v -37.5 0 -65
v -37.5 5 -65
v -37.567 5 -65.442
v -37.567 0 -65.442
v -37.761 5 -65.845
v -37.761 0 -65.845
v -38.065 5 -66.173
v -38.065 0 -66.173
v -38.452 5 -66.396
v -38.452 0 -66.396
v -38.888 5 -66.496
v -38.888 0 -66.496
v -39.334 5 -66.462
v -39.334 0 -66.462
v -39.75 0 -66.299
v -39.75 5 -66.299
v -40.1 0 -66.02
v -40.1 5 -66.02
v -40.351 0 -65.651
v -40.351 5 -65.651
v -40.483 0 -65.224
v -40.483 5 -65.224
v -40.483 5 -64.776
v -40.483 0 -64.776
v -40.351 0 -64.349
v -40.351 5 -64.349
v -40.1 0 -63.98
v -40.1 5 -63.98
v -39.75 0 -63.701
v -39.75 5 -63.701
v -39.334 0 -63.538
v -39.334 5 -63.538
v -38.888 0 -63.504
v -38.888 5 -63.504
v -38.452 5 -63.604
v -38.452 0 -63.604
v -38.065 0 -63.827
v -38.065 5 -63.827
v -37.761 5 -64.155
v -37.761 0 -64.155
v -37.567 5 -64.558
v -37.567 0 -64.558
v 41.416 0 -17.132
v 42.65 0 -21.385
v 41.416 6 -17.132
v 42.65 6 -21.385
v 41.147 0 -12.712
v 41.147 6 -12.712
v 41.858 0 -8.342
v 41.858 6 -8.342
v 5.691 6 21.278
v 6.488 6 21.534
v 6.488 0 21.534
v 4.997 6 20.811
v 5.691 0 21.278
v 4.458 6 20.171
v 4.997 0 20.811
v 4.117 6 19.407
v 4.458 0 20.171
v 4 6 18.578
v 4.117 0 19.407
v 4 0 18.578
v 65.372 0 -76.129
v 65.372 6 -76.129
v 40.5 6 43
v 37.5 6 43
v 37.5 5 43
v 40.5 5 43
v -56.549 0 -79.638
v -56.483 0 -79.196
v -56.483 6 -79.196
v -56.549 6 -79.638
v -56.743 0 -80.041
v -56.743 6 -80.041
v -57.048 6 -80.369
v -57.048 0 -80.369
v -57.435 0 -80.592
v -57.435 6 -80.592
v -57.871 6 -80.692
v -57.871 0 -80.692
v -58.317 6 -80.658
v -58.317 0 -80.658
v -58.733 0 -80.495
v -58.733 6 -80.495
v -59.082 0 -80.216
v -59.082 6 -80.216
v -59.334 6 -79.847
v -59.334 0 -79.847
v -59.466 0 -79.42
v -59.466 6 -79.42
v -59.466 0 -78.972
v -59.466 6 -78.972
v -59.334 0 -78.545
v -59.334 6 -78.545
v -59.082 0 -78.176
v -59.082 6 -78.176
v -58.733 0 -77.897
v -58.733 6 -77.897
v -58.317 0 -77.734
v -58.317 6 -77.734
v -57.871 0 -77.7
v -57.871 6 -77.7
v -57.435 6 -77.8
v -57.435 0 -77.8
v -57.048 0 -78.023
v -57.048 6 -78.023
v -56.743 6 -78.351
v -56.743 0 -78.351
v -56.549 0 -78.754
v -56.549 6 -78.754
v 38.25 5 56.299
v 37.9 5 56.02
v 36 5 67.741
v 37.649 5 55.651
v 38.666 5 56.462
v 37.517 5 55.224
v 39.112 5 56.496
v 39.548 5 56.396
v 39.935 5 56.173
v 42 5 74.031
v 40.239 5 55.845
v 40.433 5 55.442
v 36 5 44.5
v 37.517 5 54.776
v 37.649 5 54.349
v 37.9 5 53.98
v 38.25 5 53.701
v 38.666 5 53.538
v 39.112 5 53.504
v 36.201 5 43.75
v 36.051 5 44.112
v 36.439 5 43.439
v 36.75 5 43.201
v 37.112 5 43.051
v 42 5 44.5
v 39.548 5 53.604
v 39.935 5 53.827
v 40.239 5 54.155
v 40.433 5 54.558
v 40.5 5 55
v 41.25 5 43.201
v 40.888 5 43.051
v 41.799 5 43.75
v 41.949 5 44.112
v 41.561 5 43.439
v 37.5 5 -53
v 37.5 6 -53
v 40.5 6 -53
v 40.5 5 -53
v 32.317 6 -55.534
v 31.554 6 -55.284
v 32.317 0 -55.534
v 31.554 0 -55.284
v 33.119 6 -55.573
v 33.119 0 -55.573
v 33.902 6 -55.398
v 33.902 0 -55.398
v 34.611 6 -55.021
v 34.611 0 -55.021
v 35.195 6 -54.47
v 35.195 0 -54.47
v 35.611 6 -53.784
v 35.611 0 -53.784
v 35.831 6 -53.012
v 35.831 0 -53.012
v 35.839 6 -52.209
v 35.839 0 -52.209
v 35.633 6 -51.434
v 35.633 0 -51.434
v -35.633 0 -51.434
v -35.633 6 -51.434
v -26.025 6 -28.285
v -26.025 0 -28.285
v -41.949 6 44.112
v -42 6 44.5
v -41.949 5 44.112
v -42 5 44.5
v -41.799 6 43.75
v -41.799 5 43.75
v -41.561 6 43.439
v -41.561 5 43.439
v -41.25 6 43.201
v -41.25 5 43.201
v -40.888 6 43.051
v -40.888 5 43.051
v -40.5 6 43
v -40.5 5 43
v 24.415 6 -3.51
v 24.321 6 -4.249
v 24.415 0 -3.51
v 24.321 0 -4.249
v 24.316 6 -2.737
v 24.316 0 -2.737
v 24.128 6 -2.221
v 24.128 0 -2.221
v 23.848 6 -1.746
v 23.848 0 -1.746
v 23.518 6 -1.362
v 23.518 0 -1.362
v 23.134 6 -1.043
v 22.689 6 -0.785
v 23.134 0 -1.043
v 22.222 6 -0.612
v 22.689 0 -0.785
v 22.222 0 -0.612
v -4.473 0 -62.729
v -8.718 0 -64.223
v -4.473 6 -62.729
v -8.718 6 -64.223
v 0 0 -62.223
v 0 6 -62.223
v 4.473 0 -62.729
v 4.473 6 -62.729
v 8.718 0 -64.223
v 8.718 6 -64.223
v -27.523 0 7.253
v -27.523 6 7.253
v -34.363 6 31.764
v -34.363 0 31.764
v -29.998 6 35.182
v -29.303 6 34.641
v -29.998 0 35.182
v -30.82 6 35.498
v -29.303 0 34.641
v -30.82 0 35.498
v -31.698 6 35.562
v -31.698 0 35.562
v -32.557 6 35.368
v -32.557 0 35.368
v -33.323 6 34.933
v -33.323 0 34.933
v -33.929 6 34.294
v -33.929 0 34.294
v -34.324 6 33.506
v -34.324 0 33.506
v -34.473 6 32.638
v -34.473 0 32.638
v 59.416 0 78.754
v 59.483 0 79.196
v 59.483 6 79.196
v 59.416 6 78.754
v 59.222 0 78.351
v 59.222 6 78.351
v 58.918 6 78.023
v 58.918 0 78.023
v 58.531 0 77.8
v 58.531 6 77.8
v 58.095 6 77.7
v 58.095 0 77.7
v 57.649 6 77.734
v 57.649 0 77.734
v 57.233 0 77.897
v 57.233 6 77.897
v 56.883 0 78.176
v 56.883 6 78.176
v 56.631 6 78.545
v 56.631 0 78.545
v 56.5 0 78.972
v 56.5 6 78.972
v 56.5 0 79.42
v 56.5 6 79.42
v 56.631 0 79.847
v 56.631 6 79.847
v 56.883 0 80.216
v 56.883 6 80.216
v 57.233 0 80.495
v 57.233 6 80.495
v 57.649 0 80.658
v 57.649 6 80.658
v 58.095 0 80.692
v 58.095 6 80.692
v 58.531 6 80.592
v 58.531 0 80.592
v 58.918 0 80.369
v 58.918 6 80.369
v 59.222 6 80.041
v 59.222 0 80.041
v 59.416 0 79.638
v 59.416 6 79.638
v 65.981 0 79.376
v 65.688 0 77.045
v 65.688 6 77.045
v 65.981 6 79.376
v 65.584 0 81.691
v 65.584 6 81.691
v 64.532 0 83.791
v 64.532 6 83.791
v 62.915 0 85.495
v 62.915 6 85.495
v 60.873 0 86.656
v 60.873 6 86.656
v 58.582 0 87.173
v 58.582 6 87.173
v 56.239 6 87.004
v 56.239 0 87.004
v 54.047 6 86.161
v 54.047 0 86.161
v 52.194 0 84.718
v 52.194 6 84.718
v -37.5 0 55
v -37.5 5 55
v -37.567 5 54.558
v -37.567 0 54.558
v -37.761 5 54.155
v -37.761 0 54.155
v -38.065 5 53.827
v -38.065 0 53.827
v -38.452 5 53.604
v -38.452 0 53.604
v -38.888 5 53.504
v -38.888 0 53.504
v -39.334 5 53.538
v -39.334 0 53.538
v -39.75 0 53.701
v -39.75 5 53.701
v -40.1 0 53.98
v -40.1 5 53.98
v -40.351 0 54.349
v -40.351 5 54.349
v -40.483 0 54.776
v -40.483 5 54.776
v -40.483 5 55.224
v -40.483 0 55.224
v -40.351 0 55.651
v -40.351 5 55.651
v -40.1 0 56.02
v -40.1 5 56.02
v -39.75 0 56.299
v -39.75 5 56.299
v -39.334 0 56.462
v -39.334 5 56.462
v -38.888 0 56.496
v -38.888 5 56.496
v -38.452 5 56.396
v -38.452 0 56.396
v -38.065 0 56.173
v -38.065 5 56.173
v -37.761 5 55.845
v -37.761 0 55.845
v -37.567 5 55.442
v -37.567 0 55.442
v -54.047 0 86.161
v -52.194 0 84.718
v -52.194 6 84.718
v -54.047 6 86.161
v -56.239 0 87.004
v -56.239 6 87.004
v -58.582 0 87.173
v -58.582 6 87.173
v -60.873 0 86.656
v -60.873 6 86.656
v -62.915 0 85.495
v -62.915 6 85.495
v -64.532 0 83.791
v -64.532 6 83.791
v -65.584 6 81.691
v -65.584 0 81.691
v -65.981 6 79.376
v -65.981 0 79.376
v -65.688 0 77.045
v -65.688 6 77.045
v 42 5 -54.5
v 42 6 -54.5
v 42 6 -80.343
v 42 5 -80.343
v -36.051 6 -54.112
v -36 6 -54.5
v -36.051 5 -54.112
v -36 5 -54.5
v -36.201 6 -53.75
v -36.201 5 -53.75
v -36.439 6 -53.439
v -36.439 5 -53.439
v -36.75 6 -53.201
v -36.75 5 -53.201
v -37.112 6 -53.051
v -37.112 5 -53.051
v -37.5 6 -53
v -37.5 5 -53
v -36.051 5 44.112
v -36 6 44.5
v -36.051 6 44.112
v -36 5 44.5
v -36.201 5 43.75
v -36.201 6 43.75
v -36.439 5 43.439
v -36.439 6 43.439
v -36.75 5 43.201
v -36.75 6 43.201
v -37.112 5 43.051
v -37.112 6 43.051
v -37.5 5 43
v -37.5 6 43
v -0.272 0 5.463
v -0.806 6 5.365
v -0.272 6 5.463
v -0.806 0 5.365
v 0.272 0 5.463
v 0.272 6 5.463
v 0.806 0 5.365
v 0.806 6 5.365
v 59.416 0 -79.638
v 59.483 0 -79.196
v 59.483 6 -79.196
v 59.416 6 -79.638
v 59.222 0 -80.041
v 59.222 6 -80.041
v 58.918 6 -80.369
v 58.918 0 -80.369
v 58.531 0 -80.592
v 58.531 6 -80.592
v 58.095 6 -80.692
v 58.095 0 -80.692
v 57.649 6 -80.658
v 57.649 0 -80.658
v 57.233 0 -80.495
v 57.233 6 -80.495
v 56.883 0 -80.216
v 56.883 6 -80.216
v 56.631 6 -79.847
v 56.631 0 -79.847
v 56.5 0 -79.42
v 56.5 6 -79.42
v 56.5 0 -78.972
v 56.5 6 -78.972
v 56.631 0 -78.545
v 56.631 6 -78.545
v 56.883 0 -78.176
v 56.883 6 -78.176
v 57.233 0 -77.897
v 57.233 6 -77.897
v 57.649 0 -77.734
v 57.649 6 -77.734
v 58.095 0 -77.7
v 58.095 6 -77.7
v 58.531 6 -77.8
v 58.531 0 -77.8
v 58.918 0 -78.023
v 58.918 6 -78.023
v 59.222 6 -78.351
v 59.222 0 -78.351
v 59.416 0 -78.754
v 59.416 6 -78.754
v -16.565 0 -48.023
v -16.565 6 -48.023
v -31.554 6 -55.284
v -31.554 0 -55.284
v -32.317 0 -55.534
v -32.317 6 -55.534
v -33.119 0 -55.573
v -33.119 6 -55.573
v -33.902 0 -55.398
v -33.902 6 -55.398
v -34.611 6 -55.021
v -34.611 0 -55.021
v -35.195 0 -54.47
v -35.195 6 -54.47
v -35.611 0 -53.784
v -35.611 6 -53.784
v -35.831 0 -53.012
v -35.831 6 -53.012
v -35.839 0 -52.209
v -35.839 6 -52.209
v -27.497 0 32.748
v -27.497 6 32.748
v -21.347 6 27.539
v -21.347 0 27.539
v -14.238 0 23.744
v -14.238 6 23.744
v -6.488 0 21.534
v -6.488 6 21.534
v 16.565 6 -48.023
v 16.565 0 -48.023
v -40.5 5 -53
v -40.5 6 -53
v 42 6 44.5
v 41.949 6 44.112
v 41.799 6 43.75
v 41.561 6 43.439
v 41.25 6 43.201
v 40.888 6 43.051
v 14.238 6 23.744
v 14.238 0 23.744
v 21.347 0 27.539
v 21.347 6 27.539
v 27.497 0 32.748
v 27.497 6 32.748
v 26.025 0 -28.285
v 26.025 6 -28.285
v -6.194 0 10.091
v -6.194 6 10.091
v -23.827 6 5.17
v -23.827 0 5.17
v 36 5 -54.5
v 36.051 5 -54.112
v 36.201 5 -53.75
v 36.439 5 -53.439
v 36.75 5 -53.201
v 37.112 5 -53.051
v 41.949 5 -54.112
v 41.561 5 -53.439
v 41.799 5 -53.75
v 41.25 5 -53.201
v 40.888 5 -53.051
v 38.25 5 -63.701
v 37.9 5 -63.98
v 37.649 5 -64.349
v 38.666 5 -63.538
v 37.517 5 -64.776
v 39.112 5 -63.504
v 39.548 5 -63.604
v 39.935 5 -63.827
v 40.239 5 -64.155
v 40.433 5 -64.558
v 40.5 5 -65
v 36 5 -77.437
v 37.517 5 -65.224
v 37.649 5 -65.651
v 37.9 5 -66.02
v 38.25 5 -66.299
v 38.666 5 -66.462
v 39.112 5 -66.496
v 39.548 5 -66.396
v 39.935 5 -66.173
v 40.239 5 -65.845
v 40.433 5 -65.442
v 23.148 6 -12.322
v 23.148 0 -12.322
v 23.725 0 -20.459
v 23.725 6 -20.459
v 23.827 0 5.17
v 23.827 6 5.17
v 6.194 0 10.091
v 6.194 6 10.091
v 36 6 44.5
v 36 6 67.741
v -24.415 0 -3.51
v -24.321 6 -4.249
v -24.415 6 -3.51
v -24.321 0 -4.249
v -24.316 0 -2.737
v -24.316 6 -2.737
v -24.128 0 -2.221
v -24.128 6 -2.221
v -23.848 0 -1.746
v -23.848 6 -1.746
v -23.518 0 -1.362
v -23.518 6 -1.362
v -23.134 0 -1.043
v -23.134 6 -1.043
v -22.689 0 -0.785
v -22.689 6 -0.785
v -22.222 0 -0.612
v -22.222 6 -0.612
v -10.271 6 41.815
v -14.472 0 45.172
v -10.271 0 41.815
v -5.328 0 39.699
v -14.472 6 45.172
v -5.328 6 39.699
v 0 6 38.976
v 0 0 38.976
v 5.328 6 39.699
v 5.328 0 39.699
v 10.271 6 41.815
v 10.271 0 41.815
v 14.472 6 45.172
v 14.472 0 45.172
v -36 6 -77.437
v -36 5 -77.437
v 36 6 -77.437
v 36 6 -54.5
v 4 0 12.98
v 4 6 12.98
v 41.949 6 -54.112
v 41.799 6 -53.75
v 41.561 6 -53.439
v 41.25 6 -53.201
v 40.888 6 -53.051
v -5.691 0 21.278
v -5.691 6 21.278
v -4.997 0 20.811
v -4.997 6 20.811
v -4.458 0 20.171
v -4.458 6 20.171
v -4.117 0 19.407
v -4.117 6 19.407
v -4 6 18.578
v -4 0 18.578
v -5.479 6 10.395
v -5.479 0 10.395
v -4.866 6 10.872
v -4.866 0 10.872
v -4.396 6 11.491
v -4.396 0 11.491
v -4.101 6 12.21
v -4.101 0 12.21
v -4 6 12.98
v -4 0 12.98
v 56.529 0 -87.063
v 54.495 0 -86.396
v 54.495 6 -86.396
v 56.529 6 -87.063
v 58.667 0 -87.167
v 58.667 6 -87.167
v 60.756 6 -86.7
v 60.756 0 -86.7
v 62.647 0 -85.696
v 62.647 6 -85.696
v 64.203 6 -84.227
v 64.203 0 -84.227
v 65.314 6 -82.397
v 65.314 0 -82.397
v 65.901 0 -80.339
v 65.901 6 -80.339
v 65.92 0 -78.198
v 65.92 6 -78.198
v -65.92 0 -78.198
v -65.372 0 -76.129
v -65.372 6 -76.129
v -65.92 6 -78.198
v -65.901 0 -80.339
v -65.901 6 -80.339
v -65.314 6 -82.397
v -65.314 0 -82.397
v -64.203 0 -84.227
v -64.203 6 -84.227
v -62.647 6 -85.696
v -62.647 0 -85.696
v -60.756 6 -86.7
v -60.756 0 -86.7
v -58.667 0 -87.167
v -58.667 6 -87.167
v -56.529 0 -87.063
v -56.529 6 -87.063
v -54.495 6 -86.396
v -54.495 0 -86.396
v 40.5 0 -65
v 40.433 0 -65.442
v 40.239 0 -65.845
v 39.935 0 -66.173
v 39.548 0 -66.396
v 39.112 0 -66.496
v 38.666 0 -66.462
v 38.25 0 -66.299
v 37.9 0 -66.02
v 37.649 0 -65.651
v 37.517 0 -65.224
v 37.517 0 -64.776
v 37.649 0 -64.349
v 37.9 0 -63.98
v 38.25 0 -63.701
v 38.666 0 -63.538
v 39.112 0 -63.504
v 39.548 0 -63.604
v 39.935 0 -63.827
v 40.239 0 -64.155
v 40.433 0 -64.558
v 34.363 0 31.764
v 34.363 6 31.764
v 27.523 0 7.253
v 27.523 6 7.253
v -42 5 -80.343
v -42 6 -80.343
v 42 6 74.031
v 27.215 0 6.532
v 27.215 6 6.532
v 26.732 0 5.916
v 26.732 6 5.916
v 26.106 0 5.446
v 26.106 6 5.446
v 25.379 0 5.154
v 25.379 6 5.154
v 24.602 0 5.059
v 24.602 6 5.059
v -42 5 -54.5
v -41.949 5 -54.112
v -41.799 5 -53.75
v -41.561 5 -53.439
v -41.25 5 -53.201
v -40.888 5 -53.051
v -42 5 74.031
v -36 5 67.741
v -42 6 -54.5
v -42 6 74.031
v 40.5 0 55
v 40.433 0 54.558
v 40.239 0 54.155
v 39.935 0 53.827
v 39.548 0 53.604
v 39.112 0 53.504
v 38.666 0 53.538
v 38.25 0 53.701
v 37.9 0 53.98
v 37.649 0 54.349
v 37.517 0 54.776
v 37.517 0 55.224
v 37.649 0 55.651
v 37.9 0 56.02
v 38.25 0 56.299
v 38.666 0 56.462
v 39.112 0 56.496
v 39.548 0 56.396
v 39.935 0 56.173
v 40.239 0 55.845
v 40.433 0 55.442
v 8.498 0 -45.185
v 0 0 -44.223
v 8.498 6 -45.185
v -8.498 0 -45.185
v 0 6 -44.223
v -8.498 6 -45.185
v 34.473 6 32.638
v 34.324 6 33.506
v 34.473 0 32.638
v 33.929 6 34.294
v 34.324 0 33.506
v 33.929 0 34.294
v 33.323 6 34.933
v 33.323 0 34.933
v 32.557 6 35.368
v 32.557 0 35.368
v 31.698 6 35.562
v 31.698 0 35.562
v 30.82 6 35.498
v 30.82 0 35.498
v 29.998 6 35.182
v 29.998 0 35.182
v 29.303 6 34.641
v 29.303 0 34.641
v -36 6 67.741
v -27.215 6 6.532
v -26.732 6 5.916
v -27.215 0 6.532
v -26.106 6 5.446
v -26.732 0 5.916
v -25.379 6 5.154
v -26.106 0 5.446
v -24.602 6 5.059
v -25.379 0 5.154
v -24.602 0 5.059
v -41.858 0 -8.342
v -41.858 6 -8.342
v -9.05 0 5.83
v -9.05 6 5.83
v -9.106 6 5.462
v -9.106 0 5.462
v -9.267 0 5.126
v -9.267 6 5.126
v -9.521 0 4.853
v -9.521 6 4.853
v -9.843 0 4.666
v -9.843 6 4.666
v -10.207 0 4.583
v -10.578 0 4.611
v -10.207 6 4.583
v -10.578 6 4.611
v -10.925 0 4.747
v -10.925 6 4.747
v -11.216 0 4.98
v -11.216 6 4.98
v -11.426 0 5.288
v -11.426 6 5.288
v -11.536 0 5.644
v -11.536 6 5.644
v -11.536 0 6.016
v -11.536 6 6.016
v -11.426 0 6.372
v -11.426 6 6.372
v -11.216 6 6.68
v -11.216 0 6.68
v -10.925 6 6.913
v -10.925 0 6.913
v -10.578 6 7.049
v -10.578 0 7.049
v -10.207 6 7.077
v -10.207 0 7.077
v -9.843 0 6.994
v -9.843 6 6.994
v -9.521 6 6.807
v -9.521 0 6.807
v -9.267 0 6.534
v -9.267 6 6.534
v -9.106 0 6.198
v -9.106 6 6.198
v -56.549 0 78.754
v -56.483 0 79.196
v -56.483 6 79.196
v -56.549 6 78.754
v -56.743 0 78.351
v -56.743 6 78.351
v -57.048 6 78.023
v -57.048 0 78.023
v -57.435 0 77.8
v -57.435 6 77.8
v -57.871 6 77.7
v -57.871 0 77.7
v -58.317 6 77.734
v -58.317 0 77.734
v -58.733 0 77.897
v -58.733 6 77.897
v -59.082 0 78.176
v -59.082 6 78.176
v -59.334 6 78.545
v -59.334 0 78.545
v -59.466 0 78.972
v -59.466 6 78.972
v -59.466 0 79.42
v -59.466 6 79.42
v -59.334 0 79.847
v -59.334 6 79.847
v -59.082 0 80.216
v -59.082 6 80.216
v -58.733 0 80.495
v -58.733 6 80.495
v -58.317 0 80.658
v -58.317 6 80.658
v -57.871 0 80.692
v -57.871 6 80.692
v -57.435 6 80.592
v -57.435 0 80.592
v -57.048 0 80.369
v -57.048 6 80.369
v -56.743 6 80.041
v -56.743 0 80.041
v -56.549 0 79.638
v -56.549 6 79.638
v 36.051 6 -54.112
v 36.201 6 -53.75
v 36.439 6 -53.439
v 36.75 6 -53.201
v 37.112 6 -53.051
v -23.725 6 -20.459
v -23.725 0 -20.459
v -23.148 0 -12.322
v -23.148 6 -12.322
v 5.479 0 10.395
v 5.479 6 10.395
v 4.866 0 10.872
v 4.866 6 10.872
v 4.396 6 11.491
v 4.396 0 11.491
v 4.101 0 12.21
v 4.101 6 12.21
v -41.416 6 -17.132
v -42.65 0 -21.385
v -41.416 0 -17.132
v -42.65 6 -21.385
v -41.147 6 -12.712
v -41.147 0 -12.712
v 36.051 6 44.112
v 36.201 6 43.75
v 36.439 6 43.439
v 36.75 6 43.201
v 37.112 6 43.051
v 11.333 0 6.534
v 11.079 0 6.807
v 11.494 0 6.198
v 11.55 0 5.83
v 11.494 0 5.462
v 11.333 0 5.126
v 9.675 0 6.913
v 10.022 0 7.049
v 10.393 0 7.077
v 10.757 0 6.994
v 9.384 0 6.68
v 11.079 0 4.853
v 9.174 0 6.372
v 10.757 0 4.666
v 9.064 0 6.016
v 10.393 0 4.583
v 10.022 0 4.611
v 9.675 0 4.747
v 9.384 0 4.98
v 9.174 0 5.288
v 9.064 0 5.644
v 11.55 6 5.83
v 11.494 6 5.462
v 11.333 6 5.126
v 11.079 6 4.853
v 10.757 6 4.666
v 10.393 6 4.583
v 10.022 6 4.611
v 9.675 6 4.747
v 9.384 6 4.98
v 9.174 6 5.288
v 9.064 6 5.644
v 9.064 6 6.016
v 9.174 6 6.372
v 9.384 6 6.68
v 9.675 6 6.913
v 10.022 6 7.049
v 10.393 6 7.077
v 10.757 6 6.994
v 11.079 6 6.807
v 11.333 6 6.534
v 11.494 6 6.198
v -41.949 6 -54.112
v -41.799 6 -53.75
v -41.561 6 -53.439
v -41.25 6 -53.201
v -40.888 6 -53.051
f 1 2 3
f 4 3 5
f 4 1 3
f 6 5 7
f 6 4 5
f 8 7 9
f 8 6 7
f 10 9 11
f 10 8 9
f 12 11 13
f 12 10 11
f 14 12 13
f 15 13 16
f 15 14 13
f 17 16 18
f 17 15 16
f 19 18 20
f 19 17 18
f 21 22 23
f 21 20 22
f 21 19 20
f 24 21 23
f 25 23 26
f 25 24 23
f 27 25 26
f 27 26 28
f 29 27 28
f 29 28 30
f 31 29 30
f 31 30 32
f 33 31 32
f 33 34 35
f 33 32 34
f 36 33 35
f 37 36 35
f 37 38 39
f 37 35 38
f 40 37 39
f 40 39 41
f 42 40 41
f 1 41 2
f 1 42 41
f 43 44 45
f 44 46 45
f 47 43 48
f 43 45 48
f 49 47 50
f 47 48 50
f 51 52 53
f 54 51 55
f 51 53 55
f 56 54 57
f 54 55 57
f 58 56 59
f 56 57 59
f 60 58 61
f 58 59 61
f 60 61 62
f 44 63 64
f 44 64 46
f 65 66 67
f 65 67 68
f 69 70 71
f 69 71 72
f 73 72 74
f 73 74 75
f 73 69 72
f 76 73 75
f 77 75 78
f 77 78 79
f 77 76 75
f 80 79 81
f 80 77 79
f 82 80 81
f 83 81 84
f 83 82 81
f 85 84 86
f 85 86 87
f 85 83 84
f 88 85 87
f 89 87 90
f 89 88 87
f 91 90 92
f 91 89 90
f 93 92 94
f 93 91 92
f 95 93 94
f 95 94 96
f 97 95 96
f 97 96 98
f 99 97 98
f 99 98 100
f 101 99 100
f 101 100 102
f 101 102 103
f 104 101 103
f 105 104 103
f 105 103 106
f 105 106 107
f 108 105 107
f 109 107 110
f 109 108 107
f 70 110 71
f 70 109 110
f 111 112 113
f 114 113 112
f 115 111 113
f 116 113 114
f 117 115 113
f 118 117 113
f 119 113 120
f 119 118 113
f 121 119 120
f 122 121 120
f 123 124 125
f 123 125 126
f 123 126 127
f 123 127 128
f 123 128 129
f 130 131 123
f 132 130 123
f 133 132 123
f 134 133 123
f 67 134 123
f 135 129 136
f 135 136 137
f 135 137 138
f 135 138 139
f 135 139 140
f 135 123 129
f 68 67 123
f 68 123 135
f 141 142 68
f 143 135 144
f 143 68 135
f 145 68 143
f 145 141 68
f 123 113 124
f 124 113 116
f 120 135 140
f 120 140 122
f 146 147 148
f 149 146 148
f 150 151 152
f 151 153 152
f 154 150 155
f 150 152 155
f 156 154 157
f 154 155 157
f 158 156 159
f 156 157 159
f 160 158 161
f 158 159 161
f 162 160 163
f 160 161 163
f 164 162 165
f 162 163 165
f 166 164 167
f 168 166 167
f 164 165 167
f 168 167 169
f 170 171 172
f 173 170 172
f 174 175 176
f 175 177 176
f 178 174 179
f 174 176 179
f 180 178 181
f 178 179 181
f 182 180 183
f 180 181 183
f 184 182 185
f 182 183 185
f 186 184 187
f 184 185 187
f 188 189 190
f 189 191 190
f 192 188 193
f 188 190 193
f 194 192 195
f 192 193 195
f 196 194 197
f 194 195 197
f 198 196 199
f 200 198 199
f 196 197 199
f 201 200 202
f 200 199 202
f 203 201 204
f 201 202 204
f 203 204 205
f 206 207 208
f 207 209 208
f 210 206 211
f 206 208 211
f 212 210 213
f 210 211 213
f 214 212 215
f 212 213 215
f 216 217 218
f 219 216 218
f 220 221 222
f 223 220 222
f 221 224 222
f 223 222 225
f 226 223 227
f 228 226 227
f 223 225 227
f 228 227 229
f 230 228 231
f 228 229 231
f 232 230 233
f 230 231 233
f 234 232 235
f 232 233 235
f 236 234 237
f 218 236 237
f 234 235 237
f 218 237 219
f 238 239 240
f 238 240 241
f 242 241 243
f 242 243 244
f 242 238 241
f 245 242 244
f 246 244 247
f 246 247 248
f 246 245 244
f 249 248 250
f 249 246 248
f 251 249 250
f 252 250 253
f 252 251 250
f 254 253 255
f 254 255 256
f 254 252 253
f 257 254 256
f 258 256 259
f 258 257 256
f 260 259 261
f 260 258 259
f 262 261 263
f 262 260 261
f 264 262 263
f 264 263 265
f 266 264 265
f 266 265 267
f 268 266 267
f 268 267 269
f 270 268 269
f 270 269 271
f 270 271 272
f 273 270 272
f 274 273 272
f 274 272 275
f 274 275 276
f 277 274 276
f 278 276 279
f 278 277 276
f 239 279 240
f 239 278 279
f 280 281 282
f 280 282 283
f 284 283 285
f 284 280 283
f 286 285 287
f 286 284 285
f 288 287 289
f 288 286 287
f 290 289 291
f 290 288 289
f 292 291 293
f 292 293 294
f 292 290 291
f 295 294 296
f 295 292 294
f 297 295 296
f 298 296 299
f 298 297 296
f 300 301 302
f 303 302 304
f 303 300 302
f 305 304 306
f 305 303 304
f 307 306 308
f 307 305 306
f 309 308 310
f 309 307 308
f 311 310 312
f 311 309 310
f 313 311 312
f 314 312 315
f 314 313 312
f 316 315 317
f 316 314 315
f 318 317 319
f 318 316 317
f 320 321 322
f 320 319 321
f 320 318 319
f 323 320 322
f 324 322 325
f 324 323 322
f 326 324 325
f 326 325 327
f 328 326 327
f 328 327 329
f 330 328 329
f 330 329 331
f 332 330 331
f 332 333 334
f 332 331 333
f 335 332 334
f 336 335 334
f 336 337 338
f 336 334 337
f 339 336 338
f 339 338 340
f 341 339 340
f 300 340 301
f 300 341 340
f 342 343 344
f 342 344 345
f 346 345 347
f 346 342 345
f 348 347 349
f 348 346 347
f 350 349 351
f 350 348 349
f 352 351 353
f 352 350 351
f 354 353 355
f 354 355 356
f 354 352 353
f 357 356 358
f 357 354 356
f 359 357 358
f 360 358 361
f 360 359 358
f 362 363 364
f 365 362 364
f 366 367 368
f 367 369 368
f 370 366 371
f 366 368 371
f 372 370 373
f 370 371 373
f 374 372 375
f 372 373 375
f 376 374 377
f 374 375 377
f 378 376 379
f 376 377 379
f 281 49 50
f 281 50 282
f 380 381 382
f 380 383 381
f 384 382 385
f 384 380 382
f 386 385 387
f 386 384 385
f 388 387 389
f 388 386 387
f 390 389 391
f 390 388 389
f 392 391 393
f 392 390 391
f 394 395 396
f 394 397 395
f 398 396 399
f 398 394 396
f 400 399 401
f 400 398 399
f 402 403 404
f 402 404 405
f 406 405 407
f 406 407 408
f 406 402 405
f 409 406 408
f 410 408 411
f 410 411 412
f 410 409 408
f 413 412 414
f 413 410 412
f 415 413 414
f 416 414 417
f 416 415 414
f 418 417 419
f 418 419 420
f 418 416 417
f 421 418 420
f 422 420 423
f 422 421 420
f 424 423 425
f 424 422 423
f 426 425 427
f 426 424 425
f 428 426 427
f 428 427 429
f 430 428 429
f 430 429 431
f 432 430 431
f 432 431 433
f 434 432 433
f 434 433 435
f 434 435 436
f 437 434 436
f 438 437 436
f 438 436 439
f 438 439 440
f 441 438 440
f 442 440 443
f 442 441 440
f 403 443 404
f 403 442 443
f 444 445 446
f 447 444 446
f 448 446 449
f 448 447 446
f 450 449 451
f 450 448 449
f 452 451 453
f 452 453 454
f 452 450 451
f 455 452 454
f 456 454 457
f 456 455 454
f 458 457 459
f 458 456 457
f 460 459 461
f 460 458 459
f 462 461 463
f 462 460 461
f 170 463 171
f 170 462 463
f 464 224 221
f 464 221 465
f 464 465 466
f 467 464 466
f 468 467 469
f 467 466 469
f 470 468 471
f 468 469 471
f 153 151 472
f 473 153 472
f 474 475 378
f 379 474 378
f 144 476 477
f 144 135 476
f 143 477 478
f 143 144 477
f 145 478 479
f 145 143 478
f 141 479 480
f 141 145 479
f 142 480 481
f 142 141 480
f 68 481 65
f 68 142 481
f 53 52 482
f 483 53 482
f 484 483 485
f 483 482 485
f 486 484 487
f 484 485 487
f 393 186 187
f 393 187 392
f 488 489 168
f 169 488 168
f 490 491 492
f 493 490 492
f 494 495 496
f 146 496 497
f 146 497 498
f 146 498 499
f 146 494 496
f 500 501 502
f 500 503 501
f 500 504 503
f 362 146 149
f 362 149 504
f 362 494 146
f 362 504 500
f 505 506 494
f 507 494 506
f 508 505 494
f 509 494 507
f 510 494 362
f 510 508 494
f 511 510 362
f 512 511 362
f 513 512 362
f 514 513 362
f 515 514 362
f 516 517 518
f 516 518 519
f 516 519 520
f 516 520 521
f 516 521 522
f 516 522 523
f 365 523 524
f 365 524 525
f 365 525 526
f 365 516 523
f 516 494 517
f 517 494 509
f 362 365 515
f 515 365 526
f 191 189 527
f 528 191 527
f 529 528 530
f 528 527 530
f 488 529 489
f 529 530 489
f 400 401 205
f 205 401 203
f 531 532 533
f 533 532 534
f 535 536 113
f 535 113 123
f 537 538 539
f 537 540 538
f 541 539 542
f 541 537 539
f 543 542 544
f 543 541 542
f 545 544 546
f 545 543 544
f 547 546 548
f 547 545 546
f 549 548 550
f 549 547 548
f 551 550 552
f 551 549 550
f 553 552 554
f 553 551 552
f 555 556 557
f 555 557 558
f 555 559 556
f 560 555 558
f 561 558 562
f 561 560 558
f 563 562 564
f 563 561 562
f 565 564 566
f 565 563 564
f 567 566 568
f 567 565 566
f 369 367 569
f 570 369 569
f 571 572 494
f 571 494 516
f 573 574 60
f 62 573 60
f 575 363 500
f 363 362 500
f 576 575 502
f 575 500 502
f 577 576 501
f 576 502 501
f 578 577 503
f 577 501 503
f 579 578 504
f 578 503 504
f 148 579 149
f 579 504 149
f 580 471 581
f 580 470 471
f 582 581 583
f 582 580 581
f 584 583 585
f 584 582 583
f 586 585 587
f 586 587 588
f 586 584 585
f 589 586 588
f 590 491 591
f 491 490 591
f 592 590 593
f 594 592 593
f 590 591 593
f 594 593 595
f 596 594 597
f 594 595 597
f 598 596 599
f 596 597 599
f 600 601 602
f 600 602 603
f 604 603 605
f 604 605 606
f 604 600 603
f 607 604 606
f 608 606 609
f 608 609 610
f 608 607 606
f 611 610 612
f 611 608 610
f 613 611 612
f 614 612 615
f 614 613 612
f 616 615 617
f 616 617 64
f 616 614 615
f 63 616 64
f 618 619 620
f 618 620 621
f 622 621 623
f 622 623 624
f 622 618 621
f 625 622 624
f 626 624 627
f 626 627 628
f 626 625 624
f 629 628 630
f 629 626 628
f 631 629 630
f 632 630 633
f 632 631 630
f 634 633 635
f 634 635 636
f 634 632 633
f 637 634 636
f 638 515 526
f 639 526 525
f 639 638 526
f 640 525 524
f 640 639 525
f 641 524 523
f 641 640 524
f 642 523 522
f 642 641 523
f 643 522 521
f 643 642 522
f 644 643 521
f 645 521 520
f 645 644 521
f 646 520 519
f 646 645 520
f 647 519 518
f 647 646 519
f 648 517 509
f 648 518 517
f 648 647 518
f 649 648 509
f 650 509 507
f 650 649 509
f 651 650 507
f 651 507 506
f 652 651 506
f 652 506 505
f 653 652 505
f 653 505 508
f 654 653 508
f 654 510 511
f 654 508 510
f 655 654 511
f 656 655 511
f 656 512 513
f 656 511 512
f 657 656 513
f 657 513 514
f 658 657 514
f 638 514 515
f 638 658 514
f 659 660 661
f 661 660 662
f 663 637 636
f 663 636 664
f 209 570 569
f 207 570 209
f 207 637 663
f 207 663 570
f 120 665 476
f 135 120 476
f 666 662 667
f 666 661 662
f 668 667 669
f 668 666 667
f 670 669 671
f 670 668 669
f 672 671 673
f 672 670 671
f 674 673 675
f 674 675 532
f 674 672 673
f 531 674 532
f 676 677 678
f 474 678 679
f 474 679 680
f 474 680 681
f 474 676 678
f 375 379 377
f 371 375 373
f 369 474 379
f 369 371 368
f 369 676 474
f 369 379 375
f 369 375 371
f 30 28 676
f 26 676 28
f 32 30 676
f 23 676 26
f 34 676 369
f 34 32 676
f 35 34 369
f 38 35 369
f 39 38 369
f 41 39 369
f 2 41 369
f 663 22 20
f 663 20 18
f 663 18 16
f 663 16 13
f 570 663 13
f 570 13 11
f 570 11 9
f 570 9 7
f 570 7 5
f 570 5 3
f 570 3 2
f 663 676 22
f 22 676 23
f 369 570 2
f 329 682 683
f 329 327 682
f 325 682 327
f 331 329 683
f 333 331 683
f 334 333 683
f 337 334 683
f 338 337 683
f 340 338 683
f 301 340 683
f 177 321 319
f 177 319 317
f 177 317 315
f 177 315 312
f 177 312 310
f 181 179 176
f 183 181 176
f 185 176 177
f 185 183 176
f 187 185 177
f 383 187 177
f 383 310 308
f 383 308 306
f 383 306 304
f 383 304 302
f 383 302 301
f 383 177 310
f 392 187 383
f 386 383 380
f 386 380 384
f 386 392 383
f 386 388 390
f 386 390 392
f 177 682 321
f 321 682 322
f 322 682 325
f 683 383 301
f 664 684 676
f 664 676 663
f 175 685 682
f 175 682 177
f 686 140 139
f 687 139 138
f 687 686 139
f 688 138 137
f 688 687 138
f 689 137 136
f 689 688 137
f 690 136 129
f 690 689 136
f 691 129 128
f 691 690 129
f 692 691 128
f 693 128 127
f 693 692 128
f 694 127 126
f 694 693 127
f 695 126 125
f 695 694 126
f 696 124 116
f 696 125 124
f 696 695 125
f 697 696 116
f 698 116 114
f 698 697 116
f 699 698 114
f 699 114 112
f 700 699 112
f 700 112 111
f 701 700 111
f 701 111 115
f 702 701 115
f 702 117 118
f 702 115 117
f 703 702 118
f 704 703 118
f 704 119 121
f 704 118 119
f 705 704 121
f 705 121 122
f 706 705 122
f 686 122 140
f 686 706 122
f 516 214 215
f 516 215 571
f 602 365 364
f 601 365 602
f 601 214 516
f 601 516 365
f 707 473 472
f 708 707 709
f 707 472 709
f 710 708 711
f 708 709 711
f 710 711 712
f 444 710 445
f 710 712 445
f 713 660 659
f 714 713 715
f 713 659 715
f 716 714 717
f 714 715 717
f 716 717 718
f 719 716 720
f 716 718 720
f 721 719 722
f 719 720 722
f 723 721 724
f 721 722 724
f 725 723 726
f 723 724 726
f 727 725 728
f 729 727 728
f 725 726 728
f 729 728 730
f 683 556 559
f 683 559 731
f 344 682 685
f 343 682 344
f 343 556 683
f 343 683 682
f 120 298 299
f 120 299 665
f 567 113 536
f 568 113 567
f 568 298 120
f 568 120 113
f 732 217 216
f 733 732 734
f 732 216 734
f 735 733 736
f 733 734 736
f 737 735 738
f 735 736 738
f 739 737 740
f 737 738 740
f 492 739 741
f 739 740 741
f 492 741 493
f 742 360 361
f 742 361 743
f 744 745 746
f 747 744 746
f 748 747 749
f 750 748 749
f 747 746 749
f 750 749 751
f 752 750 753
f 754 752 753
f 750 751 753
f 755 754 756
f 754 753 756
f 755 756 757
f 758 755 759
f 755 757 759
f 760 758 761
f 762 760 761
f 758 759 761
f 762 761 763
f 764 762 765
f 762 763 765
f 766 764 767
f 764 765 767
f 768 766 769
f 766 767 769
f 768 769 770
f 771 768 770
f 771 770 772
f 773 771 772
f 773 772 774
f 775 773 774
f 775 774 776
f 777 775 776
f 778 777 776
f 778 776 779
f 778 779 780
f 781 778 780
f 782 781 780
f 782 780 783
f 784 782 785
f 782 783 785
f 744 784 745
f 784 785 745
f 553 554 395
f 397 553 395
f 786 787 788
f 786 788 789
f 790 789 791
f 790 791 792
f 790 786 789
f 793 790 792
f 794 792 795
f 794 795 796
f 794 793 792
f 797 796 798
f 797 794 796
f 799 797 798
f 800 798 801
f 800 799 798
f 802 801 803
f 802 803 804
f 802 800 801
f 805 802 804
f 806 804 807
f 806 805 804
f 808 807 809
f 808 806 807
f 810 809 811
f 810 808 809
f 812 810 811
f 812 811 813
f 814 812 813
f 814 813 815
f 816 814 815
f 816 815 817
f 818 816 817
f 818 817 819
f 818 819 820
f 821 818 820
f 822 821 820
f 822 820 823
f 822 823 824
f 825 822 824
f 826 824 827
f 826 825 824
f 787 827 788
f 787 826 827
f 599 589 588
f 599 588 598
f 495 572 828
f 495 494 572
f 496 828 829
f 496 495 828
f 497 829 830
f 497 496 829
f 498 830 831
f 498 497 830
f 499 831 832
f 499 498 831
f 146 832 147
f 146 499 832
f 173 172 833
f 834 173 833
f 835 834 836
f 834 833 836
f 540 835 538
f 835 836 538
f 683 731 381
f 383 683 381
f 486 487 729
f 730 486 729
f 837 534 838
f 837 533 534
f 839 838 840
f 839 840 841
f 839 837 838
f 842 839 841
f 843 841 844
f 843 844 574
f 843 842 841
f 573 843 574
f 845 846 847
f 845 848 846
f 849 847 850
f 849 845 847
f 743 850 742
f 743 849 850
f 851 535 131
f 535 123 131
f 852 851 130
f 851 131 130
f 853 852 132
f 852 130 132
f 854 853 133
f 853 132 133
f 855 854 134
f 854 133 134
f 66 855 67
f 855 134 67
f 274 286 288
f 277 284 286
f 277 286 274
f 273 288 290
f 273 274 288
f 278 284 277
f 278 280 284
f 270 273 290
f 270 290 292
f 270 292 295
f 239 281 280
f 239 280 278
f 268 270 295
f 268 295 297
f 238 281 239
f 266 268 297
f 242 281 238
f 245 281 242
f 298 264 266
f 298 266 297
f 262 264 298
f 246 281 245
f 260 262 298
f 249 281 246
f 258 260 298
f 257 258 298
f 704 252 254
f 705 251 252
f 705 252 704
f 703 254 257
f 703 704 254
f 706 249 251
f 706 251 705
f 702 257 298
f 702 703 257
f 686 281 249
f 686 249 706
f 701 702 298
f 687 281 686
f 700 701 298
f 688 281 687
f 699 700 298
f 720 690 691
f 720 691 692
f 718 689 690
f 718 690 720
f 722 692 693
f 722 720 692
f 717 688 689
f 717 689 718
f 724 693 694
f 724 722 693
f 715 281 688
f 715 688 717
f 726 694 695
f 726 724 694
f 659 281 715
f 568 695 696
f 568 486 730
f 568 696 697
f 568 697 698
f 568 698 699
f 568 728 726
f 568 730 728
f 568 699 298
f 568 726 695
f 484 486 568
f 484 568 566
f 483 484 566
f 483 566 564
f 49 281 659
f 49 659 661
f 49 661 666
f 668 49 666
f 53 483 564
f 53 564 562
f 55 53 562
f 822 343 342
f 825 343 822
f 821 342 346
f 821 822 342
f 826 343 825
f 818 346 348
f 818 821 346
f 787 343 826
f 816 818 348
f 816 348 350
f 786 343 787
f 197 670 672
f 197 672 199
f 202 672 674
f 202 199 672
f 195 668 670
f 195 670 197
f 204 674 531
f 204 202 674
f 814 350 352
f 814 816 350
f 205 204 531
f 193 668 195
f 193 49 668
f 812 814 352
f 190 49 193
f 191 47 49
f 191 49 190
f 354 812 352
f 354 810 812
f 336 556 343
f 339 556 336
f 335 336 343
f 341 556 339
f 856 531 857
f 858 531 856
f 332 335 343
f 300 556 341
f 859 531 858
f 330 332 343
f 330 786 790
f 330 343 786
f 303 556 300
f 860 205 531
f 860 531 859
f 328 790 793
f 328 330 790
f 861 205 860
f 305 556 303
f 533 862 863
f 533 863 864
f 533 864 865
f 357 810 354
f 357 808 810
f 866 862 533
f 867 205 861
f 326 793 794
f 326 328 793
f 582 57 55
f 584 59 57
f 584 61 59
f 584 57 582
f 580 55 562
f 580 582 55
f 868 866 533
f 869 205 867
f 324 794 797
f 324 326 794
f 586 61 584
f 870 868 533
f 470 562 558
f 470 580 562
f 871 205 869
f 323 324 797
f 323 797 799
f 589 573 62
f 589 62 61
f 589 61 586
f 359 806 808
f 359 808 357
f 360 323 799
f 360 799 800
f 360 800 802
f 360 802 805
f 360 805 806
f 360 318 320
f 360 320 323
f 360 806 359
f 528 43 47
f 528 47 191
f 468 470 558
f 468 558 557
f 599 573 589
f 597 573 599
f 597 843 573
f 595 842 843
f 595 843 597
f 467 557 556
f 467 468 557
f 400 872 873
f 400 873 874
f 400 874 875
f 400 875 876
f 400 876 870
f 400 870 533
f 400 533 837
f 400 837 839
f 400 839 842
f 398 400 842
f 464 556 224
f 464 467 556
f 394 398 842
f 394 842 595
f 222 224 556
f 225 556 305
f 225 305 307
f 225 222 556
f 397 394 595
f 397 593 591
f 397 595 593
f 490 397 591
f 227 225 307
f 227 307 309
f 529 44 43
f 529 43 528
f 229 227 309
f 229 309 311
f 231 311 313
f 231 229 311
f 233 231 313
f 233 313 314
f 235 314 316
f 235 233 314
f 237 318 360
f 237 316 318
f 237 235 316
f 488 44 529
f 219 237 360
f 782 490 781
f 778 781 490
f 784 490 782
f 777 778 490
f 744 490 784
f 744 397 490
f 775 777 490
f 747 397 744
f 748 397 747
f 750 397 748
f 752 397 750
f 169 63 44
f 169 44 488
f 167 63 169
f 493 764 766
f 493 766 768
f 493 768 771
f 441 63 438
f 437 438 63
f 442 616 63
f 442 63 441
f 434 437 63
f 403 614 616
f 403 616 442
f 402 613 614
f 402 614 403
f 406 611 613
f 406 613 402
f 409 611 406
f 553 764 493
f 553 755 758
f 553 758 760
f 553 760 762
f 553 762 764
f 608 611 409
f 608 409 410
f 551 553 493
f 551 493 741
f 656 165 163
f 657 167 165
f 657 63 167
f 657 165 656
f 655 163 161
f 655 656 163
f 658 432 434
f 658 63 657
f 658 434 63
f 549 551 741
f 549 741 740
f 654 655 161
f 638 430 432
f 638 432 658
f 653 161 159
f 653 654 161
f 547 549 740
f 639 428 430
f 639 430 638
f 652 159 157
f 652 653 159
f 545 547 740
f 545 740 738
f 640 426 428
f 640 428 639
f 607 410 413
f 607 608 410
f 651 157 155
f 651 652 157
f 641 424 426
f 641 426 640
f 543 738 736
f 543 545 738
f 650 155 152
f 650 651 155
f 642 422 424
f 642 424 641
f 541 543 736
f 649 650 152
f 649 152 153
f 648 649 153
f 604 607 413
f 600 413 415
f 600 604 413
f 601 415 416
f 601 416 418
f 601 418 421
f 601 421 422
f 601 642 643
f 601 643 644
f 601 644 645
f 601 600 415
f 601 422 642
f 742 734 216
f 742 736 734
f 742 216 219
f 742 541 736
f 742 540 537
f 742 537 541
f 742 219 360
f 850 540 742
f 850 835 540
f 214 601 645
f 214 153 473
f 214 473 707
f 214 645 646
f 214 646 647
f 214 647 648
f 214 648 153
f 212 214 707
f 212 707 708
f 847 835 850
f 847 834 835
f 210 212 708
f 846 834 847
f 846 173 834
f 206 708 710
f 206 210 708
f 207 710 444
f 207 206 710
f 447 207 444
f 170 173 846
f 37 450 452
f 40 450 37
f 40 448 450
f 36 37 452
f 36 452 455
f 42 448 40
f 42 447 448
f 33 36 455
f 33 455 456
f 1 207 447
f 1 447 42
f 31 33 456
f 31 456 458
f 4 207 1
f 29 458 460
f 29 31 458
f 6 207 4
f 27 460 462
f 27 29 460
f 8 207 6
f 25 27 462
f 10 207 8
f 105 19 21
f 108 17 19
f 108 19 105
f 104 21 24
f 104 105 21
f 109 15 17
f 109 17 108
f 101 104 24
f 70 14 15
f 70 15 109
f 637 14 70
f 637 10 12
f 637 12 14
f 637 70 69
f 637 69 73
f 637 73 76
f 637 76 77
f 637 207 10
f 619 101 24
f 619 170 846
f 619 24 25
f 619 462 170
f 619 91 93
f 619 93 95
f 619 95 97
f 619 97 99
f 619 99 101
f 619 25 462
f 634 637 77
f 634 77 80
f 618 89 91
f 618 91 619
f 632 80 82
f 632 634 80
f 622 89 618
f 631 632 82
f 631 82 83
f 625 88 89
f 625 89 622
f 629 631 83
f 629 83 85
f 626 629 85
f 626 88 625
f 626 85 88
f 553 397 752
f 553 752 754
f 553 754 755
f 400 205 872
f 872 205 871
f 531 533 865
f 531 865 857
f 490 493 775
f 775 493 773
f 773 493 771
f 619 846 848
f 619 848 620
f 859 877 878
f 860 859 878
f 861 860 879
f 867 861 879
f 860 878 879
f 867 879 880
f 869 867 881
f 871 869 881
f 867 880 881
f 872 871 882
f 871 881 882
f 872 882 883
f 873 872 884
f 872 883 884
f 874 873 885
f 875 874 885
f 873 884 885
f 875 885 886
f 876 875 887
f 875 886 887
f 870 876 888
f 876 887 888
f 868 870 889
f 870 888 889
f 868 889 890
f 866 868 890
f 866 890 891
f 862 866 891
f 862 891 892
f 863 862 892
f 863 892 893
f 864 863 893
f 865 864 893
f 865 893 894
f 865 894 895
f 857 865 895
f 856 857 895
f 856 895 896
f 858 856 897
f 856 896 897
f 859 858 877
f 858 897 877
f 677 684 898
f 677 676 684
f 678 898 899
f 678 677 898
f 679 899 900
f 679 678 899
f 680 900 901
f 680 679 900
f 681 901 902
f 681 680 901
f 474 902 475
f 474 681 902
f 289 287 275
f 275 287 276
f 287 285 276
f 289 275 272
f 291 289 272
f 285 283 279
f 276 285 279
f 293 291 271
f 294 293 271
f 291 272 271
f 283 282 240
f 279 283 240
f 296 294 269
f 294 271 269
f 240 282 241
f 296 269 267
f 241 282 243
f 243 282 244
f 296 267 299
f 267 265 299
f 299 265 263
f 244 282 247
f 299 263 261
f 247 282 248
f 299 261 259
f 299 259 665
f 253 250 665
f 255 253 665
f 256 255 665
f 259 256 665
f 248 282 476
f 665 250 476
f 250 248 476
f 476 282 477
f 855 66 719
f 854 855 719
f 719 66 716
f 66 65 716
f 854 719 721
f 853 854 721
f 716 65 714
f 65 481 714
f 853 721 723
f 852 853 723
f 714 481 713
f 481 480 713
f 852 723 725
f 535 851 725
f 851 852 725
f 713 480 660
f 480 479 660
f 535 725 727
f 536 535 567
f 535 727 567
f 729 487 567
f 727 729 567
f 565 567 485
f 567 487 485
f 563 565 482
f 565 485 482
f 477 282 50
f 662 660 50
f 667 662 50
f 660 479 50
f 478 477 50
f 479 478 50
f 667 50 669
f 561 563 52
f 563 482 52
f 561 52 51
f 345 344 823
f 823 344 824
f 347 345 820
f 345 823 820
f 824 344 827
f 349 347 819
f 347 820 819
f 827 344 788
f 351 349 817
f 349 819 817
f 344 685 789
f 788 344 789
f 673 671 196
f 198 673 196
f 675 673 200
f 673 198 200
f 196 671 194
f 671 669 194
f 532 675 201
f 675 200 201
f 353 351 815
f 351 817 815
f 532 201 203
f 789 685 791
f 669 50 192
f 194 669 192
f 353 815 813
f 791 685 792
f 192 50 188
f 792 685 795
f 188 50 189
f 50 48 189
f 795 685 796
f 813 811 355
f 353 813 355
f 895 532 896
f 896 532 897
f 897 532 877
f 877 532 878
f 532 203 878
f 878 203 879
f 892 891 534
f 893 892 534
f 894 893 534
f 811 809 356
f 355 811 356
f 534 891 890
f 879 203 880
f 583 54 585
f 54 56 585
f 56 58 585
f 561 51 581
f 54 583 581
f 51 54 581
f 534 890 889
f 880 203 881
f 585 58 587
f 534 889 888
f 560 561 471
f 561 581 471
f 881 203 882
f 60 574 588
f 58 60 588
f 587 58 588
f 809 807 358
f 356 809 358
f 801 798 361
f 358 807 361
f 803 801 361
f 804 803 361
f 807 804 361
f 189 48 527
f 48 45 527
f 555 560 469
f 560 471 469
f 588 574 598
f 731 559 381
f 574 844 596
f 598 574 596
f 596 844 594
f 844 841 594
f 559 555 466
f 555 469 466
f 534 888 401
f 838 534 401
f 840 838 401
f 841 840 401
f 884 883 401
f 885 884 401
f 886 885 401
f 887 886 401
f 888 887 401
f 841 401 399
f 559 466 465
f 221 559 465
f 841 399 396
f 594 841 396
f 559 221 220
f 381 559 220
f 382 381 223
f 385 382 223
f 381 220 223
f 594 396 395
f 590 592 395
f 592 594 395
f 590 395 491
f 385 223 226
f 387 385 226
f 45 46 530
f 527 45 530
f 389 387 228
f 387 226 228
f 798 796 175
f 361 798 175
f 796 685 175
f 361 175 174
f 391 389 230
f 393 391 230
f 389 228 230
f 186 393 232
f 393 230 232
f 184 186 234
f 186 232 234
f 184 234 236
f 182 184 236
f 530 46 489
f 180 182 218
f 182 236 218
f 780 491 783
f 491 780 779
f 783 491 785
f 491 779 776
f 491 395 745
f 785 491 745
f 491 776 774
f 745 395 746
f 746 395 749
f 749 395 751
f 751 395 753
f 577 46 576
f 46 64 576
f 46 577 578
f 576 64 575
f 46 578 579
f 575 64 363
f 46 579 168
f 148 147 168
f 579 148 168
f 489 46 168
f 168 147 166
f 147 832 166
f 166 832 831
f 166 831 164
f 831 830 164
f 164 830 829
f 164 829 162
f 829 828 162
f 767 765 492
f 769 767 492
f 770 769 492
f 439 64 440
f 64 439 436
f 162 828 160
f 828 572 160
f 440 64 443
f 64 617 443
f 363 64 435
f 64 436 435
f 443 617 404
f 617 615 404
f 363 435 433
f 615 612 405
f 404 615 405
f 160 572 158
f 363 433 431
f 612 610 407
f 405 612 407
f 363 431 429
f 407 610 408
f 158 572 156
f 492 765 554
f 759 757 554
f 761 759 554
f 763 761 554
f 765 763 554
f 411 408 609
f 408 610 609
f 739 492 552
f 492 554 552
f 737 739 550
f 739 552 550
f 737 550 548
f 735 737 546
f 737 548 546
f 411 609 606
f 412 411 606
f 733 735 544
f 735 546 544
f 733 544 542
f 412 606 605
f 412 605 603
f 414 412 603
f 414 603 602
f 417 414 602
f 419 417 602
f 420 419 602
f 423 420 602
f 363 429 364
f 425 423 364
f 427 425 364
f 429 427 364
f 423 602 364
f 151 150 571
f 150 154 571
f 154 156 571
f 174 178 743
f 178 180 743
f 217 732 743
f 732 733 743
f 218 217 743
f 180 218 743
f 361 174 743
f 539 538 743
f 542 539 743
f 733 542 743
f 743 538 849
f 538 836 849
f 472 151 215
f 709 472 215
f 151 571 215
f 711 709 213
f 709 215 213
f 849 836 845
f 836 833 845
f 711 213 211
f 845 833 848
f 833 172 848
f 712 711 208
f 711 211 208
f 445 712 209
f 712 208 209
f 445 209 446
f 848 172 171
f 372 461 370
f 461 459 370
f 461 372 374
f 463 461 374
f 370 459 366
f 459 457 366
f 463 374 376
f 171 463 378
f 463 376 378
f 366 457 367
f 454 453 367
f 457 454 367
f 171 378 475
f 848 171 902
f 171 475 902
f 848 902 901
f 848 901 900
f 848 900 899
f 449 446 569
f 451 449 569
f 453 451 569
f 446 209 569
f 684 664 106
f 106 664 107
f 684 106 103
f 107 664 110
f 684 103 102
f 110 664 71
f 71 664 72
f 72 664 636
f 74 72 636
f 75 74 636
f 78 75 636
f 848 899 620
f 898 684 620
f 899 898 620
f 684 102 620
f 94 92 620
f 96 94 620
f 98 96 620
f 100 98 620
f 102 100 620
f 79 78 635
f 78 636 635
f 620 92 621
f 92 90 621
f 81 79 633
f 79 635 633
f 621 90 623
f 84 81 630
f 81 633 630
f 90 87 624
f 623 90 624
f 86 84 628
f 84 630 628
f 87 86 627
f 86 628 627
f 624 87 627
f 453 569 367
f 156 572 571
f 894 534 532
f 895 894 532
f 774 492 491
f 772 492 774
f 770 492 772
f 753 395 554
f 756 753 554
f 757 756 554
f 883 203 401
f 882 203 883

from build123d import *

# Parameters (mm, degrees)
SKETCH1_R           = 1.5
BOSS_EXTRUDE1_DEPTH = 6
FILLET1_R           = 20
CUT_EXTRUDE1_REACH  = 8
SKETCH5_R           = 1.25
BOSS_EXTRUDE2_DEPTH = 6
FILLET2_R           = 3
SKETCH6_W           = 6
SKETCH6_H           = 31.030846562
SKETCH6_H_2         = 27.343468982
CUT_EXTRUDE2_DEPTH  = 1
FILLET3_R           = 1.5


with BuildPart() as part:
    # Sketch1 → Boss-Extrude1 (new body)
    with BuildSketch(Plane(origin=(0, 0, 0), x_dir=(1, 0, 0), z_dir=(0, 1, 0))):
        with BuildLine():
            Line((-54.495367447, 86.395828983), (0, 60))
            Line((0, 60), (54.495367447, 86.395828983))
            ThreePointArc((54.495367447, 86.395828983), (63.474216903, 85.013506895), (65.371608634, 76.129225465))
            Line((65.371608634, 76.129225465), (40, 15))
            Line((40, 15), (65.688300647, -77.045475229))
            ThreePointArc((65.688300647, -77.045475229), (61.936793138, -86.150496915), (52.193978606, -84.717739607))
            Line((52.193978606, -84.717739607), (0, -30))
            Line((0, -30), (-52.193978606, -84.717739607))
            ThreePointArc((-52.193978606, -84.717739607), (-61.936793138, -86.150496915), (-65.688300647, -77.045475229))
            Line((-65.688300647, -77.045475229), (-40, 15))
            Line((-40, 15), (-65.371608634, 76.129225465))
            ThreePointArc((-65.371608634, 76.129225465), (-63.474216903, 85.013506895), (-54.495367447, 86.395828983))
        make_face()
        with Locations((-57.982756057, 79.195959493)):
            Circle(SKETCH1_R, mode=Mode.SUBTRACT)
        with Locations((57.982756057, 79.195959493)):
            Circle(SKETCH1_R, mode=Mode.SUBTRACT)
        with Locations((-57.982756057, -79.195959493)):
            Circle(SKETCH1_R, mode=Mode.SUBTRACT)
        with Locations((57.982756057, -79.195959493)):
            Circle(SKETCH1_R, mode=Mode.SUBTRACT)
        with Locations((-39, 65)):
            Circle(SKETCH1_R, mode=Mode.SUBTRACT)
        with Locations((39, 65)):
            Circle(SKETCH1_R, mode=Mode.SUBTRACT)
        with Locations((39, -55)):
            Circle(SKETCH1_R, mode=Mode.SUBTRACT)
        with Locations((-39, -55)):
            Circle(SKETCH1_R, mode=Mode.SUBTRACT)
    extrude(amount=BOSS_EXTRUDE1_DEPTH)

    # Fillet1
    fillet1_edges = [part.edges().sort_by_distance(p)[0] for p in [
        (0, 3, -60),
        (40, 3, -15),
        (0, 3, 30),
        (-40, 3, -15),
    ]]
    fillet(fillet1_edges, radius=FILLET1_R)

    # Sketch2 → Cut-Extrude1 (cut, up to next)
    with BuildSketch(Plane(origin=(0, 6, 0), x_dir=(1, 0, 0), z_dir=(0, 1, 0)), mode=Mode.PRIVATE) as cut_extrude1_sk1:
        with BuildLine():
            Line((-38.659149277, 58.724904233), (-26.025041931, 28.284847884))
            ThreePointArc((-26.025041931, 28.284847884), (-23.19190714, 16.020273346), (-24.520754868, 3.503060996))
            Line((-24.520754868, 3.503060996), (-37.591117294, -43.330232394))
            Line((-37.591117294, -43.330232394), (-27.496692892, -32.747707347))
            ThreePointArc((-27.496692892, -32.747707347), (0, -20.976162887), (27.496692892, -32.747707347))
            Line((27.496692892, -32.747707347), (37.591117294, -43.330232394))
            Line((37.591117294, -43.330232394), (24.520754868, 3.503060996))
            ThreePointArc((24.520754868, 3.503060996), (23.19190714, 16.020273346), (26.025041931, 28.284847884))
            Line((26.025041931, 28.284847884), (38.659149277, 58.724904233))
            Line((38.659149277, 58.724904233), (16.565095901, 48.023244958))
            ThreePointArc((16.565095901, 48.023244958), (0, 44.222625037), (-16.565095901, 48.023244958))
            Line((-16.565095901, 48.023244958), (-38.659149277, 58.724904233))
        make_face()
    cut_extrude1_tool1 = extrude(cut_extrude1_sk1.sketch, amount=-CUT_EXTRUDE1_REACH, mode=Mode.PRIVATE) & part.part
    add(cut_extrude1_tool1.solids().sort_by_distance((0, 6, -11.023996))[0], mode=Mode.SUBTRACT)

    # Sketch5 → Boss-Extrude2 (add)
    with BuildSketch(Plane(origin=(0, 6, 0), x_dir=(1, 0, 0), z_dir=(0, 1, 0))):
        with BuildLine():
            Line((-25.103227244, 1.415965109), (0, -5.589911573))
            Line((0, -5.589911573), (25.103227244, 1.415965109))
            Line((25.103227244, 1.415965109), (26.716090442, -4.363193333))
            Line((26.716090442, -4.363193333), (4, -10.702861409))
            Line((4, -10.702861409), (4, -21.187275631))
            ThreePointArc((4, -21.187275631), (0, -20.976162887), (-4, -21.187275631))
            Line((-4, -21.187275631), (-4, -10.702861409))
            Line((-4, -10.702861409), (-26.716090442, -4.363193333))
            Line((-26.716090442, -4.363193333), (-25.103227244, 1.415965109))
        make_face()
        with Locations((-10.3, -5.83)):
            Circle(SKETCH5_R, mode=Mode.SUBTRACT)
        with Locations((10.3, -5.83)):
            Circle(SKETCH5_R, mode=Mode.SUBTRACT)
    extrude(amount=-BOSS_EXTRUDE2_DEPTH)

    # Fillet2
    fillet2_edges = [part.edges().sort_by_distance(p)[0] for p in [
        (37.591117294, 3, 43.330232394),
        (-37.591117294, 3, 43.330232394),
        (38.659149277, 3, -58.724904233),
        (-38.659149277, 3, -58.724904233),
        (25.103227244, 3, -1.415965109),
        (-25.103227244, 3, -1.415965109),
        (0, 3, 5.589911573),
        (26.716090442, 3, 4.363193333),
        (4, 3, 10.702861409),
        (4, 3, 21.187275631),
        (-4, 3, 21.187275631),
        (-4, 3, 10.702861409),
        (-26.716090442, 3, 4.363193333),
    ]]
    fillet(fillet2_edges, radius=FILLET2_R)

    # Sketch6 → Cut-Extrude2 (cut)
    with BuildSketch(Plane(origin=(0, 6, 0), x_dir=(1, 0, 0), z_dir=(0, 1, 0))):
        with Locations((-39, -58.515423281)):
            Rectangle(SKETCH6_W, SKETCH6_H)
        with Locations((39, -58.515423281)):
            Rectangle(SKETCH6_W, SKETCH6_H)
        with Locations((39, 66.671734491)):
            Rectangle(SKETCH6_W, SKETCH6_H_2)
        with Locations((-39, 66.671734491)):
            Rectangle(SKETCH6_W, SKETCH6_H_2)
    extrude(amount=-CUT_EXTRUDE2_DEPTH, mode=Mode.SUBTRACT)

    # Fillet3
    fillet3_edges = [part.edges().sort_by_distance(p)[0] for p in [
        (-36, 5.5, 43),
        (-42, 5.5, 43),
        (36, 5.5, 43),
        (42, 5.5, 43),
        (36, 5.5, -53),
        (42, 5.5, -53),
        (-42, 5.5, -53),
        (-36, 5.5, -53),
    ]]
    fillet(fillet3_edges, radius=FILLET3_R)


solid = part.part
